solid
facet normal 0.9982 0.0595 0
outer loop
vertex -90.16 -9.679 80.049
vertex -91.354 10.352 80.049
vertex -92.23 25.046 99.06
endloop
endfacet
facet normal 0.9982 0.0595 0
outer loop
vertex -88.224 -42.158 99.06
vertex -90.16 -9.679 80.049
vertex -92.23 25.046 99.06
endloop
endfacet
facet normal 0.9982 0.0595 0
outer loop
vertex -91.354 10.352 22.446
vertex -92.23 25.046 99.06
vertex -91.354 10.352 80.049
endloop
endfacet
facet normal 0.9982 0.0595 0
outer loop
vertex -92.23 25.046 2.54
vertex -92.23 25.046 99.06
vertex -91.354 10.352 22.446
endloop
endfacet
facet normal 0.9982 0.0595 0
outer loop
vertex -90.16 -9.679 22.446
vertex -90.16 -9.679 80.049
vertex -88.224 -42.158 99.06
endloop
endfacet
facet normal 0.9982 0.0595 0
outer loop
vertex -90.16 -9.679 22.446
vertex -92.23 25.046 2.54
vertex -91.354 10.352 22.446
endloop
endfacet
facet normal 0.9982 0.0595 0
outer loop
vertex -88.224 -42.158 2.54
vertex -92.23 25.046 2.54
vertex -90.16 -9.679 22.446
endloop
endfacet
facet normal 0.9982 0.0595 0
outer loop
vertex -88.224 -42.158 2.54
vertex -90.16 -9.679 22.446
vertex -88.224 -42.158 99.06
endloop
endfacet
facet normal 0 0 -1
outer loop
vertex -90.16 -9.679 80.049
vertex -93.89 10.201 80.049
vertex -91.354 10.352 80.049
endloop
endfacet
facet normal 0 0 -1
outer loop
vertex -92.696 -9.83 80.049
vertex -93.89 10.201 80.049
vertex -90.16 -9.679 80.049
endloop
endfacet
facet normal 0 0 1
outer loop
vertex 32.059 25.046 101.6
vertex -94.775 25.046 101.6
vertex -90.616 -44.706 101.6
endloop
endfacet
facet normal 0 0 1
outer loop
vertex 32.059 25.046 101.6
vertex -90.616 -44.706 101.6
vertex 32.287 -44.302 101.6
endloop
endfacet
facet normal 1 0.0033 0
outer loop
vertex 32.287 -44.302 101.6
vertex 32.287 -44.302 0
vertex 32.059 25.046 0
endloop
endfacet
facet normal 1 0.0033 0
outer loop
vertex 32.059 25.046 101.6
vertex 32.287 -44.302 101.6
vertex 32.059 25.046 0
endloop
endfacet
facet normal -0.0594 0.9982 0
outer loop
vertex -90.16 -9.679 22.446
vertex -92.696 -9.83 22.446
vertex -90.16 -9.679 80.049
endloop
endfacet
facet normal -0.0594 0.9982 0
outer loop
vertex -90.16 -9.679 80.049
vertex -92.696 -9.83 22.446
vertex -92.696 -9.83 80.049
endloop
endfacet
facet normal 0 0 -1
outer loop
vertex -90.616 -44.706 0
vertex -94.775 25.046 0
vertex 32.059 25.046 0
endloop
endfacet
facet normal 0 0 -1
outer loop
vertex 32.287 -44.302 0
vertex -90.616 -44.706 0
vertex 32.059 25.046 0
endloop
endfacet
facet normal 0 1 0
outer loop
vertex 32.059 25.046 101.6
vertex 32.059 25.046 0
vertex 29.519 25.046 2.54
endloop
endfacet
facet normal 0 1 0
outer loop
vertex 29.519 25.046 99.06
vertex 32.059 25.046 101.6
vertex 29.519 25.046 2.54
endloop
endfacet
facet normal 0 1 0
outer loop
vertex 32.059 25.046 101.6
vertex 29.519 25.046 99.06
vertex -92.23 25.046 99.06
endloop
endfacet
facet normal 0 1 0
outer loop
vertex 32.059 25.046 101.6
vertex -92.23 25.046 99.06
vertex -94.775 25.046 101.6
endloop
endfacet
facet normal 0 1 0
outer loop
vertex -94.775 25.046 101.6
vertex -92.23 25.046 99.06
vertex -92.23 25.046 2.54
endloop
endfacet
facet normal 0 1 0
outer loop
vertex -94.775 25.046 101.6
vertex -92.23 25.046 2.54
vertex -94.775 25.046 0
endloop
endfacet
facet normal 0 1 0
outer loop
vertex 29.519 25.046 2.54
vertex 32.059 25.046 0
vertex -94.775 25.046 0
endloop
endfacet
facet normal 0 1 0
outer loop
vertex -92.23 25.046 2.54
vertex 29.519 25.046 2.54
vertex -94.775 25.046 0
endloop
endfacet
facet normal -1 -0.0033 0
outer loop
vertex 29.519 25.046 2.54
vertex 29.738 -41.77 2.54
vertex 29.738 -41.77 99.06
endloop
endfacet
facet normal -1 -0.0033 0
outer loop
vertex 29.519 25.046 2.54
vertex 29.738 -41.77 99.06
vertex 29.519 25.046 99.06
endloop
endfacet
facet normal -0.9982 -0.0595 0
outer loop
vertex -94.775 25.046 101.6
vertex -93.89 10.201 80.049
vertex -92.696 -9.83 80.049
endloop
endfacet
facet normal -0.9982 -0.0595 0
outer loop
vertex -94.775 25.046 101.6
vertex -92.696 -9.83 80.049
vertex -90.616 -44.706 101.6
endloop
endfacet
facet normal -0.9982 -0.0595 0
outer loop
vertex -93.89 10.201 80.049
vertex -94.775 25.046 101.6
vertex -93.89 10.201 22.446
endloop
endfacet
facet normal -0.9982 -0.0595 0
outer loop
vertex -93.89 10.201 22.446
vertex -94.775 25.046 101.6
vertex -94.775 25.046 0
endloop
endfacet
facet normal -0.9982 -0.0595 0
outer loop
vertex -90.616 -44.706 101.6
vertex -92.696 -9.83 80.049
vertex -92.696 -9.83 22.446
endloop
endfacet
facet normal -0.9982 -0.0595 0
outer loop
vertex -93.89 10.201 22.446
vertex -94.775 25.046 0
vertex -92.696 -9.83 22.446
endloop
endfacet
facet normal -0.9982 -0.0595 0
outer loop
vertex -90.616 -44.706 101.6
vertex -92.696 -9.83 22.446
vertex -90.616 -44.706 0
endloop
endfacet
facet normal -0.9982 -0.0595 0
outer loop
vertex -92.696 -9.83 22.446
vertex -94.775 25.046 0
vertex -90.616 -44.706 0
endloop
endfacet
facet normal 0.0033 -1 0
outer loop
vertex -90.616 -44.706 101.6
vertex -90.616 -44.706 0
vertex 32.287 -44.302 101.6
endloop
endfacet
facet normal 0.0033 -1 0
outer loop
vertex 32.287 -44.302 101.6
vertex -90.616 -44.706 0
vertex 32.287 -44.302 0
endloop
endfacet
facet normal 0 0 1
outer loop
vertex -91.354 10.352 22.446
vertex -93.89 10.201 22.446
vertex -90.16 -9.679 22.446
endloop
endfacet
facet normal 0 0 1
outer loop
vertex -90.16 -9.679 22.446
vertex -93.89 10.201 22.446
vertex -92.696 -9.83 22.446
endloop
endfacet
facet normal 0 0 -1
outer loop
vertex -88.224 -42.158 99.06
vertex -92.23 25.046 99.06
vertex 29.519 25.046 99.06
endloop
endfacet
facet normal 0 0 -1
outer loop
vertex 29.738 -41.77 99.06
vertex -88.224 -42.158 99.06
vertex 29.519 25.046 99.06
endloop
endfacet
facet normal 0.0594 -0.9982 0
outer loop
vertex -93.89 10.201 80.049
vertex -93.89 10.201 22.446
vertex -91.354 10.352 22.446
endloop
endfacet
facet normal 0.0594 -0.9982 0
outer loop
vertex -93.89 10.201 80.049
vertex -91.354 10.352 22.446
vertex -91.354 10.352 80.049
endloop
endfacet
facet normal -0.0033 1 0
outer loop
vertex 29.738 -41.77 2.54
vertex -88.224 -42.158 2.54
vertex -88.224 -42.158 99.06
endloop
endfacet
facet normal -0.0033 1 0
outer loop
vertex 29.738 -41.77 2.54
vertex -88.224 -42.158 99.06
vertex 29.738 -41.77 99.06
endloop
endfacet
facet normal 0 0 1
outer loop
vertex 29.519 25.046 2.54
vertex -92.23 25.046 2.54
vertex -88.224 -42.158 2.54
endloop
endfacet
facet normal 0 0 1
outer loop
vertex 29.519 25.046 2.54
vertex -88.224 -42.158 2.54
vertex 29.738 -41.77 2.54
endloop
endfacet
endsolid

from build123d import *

# Parameters (mm, degrees)
F1_DEPTH = 101.6
F2_T     = -2.54
F3_W     = 20.0663776208
F3_H     = 57.6037857682
F4_DEPTH = 50.8


with BuildPart() as f1:
    # F0 (on Top) → F1 (new body)
    with BuildSketch(Plane.XY):
        Polygon((32.0586711168, 25.0460729003), (-94.7746559978, 25.0460729003), (-90.6164767412, -44.7059123562), (32.2867780924, -44.3016439676), align=None)
    extrude(amount=F1_DEPTH)

    # F2
    f2_openings = [f1.faces().sort_by_distance(p)[0] for p in [
        (-31.357992, 25.046073, 50.8),
    ]]
    offset(amount=F2_T, openings=f2_openings)

    # F3 (on face) → F4 (cut)
    with BuildSketch(Plane(origin=(-92.951234691, -5.5411741264, 0), x_dir=(0.0595081302, -0.9982278209, 0), z_dir=(-0.9982278209, -0.0595081302, 0))):
        with Locations((-5.7368292903, 51.2475920841)):
            Rectangle(F3_W, F3_H)
    extrude(amount=-F4_DEPTH, mode=Mode.SUBTRACT)


solid = f1.part
